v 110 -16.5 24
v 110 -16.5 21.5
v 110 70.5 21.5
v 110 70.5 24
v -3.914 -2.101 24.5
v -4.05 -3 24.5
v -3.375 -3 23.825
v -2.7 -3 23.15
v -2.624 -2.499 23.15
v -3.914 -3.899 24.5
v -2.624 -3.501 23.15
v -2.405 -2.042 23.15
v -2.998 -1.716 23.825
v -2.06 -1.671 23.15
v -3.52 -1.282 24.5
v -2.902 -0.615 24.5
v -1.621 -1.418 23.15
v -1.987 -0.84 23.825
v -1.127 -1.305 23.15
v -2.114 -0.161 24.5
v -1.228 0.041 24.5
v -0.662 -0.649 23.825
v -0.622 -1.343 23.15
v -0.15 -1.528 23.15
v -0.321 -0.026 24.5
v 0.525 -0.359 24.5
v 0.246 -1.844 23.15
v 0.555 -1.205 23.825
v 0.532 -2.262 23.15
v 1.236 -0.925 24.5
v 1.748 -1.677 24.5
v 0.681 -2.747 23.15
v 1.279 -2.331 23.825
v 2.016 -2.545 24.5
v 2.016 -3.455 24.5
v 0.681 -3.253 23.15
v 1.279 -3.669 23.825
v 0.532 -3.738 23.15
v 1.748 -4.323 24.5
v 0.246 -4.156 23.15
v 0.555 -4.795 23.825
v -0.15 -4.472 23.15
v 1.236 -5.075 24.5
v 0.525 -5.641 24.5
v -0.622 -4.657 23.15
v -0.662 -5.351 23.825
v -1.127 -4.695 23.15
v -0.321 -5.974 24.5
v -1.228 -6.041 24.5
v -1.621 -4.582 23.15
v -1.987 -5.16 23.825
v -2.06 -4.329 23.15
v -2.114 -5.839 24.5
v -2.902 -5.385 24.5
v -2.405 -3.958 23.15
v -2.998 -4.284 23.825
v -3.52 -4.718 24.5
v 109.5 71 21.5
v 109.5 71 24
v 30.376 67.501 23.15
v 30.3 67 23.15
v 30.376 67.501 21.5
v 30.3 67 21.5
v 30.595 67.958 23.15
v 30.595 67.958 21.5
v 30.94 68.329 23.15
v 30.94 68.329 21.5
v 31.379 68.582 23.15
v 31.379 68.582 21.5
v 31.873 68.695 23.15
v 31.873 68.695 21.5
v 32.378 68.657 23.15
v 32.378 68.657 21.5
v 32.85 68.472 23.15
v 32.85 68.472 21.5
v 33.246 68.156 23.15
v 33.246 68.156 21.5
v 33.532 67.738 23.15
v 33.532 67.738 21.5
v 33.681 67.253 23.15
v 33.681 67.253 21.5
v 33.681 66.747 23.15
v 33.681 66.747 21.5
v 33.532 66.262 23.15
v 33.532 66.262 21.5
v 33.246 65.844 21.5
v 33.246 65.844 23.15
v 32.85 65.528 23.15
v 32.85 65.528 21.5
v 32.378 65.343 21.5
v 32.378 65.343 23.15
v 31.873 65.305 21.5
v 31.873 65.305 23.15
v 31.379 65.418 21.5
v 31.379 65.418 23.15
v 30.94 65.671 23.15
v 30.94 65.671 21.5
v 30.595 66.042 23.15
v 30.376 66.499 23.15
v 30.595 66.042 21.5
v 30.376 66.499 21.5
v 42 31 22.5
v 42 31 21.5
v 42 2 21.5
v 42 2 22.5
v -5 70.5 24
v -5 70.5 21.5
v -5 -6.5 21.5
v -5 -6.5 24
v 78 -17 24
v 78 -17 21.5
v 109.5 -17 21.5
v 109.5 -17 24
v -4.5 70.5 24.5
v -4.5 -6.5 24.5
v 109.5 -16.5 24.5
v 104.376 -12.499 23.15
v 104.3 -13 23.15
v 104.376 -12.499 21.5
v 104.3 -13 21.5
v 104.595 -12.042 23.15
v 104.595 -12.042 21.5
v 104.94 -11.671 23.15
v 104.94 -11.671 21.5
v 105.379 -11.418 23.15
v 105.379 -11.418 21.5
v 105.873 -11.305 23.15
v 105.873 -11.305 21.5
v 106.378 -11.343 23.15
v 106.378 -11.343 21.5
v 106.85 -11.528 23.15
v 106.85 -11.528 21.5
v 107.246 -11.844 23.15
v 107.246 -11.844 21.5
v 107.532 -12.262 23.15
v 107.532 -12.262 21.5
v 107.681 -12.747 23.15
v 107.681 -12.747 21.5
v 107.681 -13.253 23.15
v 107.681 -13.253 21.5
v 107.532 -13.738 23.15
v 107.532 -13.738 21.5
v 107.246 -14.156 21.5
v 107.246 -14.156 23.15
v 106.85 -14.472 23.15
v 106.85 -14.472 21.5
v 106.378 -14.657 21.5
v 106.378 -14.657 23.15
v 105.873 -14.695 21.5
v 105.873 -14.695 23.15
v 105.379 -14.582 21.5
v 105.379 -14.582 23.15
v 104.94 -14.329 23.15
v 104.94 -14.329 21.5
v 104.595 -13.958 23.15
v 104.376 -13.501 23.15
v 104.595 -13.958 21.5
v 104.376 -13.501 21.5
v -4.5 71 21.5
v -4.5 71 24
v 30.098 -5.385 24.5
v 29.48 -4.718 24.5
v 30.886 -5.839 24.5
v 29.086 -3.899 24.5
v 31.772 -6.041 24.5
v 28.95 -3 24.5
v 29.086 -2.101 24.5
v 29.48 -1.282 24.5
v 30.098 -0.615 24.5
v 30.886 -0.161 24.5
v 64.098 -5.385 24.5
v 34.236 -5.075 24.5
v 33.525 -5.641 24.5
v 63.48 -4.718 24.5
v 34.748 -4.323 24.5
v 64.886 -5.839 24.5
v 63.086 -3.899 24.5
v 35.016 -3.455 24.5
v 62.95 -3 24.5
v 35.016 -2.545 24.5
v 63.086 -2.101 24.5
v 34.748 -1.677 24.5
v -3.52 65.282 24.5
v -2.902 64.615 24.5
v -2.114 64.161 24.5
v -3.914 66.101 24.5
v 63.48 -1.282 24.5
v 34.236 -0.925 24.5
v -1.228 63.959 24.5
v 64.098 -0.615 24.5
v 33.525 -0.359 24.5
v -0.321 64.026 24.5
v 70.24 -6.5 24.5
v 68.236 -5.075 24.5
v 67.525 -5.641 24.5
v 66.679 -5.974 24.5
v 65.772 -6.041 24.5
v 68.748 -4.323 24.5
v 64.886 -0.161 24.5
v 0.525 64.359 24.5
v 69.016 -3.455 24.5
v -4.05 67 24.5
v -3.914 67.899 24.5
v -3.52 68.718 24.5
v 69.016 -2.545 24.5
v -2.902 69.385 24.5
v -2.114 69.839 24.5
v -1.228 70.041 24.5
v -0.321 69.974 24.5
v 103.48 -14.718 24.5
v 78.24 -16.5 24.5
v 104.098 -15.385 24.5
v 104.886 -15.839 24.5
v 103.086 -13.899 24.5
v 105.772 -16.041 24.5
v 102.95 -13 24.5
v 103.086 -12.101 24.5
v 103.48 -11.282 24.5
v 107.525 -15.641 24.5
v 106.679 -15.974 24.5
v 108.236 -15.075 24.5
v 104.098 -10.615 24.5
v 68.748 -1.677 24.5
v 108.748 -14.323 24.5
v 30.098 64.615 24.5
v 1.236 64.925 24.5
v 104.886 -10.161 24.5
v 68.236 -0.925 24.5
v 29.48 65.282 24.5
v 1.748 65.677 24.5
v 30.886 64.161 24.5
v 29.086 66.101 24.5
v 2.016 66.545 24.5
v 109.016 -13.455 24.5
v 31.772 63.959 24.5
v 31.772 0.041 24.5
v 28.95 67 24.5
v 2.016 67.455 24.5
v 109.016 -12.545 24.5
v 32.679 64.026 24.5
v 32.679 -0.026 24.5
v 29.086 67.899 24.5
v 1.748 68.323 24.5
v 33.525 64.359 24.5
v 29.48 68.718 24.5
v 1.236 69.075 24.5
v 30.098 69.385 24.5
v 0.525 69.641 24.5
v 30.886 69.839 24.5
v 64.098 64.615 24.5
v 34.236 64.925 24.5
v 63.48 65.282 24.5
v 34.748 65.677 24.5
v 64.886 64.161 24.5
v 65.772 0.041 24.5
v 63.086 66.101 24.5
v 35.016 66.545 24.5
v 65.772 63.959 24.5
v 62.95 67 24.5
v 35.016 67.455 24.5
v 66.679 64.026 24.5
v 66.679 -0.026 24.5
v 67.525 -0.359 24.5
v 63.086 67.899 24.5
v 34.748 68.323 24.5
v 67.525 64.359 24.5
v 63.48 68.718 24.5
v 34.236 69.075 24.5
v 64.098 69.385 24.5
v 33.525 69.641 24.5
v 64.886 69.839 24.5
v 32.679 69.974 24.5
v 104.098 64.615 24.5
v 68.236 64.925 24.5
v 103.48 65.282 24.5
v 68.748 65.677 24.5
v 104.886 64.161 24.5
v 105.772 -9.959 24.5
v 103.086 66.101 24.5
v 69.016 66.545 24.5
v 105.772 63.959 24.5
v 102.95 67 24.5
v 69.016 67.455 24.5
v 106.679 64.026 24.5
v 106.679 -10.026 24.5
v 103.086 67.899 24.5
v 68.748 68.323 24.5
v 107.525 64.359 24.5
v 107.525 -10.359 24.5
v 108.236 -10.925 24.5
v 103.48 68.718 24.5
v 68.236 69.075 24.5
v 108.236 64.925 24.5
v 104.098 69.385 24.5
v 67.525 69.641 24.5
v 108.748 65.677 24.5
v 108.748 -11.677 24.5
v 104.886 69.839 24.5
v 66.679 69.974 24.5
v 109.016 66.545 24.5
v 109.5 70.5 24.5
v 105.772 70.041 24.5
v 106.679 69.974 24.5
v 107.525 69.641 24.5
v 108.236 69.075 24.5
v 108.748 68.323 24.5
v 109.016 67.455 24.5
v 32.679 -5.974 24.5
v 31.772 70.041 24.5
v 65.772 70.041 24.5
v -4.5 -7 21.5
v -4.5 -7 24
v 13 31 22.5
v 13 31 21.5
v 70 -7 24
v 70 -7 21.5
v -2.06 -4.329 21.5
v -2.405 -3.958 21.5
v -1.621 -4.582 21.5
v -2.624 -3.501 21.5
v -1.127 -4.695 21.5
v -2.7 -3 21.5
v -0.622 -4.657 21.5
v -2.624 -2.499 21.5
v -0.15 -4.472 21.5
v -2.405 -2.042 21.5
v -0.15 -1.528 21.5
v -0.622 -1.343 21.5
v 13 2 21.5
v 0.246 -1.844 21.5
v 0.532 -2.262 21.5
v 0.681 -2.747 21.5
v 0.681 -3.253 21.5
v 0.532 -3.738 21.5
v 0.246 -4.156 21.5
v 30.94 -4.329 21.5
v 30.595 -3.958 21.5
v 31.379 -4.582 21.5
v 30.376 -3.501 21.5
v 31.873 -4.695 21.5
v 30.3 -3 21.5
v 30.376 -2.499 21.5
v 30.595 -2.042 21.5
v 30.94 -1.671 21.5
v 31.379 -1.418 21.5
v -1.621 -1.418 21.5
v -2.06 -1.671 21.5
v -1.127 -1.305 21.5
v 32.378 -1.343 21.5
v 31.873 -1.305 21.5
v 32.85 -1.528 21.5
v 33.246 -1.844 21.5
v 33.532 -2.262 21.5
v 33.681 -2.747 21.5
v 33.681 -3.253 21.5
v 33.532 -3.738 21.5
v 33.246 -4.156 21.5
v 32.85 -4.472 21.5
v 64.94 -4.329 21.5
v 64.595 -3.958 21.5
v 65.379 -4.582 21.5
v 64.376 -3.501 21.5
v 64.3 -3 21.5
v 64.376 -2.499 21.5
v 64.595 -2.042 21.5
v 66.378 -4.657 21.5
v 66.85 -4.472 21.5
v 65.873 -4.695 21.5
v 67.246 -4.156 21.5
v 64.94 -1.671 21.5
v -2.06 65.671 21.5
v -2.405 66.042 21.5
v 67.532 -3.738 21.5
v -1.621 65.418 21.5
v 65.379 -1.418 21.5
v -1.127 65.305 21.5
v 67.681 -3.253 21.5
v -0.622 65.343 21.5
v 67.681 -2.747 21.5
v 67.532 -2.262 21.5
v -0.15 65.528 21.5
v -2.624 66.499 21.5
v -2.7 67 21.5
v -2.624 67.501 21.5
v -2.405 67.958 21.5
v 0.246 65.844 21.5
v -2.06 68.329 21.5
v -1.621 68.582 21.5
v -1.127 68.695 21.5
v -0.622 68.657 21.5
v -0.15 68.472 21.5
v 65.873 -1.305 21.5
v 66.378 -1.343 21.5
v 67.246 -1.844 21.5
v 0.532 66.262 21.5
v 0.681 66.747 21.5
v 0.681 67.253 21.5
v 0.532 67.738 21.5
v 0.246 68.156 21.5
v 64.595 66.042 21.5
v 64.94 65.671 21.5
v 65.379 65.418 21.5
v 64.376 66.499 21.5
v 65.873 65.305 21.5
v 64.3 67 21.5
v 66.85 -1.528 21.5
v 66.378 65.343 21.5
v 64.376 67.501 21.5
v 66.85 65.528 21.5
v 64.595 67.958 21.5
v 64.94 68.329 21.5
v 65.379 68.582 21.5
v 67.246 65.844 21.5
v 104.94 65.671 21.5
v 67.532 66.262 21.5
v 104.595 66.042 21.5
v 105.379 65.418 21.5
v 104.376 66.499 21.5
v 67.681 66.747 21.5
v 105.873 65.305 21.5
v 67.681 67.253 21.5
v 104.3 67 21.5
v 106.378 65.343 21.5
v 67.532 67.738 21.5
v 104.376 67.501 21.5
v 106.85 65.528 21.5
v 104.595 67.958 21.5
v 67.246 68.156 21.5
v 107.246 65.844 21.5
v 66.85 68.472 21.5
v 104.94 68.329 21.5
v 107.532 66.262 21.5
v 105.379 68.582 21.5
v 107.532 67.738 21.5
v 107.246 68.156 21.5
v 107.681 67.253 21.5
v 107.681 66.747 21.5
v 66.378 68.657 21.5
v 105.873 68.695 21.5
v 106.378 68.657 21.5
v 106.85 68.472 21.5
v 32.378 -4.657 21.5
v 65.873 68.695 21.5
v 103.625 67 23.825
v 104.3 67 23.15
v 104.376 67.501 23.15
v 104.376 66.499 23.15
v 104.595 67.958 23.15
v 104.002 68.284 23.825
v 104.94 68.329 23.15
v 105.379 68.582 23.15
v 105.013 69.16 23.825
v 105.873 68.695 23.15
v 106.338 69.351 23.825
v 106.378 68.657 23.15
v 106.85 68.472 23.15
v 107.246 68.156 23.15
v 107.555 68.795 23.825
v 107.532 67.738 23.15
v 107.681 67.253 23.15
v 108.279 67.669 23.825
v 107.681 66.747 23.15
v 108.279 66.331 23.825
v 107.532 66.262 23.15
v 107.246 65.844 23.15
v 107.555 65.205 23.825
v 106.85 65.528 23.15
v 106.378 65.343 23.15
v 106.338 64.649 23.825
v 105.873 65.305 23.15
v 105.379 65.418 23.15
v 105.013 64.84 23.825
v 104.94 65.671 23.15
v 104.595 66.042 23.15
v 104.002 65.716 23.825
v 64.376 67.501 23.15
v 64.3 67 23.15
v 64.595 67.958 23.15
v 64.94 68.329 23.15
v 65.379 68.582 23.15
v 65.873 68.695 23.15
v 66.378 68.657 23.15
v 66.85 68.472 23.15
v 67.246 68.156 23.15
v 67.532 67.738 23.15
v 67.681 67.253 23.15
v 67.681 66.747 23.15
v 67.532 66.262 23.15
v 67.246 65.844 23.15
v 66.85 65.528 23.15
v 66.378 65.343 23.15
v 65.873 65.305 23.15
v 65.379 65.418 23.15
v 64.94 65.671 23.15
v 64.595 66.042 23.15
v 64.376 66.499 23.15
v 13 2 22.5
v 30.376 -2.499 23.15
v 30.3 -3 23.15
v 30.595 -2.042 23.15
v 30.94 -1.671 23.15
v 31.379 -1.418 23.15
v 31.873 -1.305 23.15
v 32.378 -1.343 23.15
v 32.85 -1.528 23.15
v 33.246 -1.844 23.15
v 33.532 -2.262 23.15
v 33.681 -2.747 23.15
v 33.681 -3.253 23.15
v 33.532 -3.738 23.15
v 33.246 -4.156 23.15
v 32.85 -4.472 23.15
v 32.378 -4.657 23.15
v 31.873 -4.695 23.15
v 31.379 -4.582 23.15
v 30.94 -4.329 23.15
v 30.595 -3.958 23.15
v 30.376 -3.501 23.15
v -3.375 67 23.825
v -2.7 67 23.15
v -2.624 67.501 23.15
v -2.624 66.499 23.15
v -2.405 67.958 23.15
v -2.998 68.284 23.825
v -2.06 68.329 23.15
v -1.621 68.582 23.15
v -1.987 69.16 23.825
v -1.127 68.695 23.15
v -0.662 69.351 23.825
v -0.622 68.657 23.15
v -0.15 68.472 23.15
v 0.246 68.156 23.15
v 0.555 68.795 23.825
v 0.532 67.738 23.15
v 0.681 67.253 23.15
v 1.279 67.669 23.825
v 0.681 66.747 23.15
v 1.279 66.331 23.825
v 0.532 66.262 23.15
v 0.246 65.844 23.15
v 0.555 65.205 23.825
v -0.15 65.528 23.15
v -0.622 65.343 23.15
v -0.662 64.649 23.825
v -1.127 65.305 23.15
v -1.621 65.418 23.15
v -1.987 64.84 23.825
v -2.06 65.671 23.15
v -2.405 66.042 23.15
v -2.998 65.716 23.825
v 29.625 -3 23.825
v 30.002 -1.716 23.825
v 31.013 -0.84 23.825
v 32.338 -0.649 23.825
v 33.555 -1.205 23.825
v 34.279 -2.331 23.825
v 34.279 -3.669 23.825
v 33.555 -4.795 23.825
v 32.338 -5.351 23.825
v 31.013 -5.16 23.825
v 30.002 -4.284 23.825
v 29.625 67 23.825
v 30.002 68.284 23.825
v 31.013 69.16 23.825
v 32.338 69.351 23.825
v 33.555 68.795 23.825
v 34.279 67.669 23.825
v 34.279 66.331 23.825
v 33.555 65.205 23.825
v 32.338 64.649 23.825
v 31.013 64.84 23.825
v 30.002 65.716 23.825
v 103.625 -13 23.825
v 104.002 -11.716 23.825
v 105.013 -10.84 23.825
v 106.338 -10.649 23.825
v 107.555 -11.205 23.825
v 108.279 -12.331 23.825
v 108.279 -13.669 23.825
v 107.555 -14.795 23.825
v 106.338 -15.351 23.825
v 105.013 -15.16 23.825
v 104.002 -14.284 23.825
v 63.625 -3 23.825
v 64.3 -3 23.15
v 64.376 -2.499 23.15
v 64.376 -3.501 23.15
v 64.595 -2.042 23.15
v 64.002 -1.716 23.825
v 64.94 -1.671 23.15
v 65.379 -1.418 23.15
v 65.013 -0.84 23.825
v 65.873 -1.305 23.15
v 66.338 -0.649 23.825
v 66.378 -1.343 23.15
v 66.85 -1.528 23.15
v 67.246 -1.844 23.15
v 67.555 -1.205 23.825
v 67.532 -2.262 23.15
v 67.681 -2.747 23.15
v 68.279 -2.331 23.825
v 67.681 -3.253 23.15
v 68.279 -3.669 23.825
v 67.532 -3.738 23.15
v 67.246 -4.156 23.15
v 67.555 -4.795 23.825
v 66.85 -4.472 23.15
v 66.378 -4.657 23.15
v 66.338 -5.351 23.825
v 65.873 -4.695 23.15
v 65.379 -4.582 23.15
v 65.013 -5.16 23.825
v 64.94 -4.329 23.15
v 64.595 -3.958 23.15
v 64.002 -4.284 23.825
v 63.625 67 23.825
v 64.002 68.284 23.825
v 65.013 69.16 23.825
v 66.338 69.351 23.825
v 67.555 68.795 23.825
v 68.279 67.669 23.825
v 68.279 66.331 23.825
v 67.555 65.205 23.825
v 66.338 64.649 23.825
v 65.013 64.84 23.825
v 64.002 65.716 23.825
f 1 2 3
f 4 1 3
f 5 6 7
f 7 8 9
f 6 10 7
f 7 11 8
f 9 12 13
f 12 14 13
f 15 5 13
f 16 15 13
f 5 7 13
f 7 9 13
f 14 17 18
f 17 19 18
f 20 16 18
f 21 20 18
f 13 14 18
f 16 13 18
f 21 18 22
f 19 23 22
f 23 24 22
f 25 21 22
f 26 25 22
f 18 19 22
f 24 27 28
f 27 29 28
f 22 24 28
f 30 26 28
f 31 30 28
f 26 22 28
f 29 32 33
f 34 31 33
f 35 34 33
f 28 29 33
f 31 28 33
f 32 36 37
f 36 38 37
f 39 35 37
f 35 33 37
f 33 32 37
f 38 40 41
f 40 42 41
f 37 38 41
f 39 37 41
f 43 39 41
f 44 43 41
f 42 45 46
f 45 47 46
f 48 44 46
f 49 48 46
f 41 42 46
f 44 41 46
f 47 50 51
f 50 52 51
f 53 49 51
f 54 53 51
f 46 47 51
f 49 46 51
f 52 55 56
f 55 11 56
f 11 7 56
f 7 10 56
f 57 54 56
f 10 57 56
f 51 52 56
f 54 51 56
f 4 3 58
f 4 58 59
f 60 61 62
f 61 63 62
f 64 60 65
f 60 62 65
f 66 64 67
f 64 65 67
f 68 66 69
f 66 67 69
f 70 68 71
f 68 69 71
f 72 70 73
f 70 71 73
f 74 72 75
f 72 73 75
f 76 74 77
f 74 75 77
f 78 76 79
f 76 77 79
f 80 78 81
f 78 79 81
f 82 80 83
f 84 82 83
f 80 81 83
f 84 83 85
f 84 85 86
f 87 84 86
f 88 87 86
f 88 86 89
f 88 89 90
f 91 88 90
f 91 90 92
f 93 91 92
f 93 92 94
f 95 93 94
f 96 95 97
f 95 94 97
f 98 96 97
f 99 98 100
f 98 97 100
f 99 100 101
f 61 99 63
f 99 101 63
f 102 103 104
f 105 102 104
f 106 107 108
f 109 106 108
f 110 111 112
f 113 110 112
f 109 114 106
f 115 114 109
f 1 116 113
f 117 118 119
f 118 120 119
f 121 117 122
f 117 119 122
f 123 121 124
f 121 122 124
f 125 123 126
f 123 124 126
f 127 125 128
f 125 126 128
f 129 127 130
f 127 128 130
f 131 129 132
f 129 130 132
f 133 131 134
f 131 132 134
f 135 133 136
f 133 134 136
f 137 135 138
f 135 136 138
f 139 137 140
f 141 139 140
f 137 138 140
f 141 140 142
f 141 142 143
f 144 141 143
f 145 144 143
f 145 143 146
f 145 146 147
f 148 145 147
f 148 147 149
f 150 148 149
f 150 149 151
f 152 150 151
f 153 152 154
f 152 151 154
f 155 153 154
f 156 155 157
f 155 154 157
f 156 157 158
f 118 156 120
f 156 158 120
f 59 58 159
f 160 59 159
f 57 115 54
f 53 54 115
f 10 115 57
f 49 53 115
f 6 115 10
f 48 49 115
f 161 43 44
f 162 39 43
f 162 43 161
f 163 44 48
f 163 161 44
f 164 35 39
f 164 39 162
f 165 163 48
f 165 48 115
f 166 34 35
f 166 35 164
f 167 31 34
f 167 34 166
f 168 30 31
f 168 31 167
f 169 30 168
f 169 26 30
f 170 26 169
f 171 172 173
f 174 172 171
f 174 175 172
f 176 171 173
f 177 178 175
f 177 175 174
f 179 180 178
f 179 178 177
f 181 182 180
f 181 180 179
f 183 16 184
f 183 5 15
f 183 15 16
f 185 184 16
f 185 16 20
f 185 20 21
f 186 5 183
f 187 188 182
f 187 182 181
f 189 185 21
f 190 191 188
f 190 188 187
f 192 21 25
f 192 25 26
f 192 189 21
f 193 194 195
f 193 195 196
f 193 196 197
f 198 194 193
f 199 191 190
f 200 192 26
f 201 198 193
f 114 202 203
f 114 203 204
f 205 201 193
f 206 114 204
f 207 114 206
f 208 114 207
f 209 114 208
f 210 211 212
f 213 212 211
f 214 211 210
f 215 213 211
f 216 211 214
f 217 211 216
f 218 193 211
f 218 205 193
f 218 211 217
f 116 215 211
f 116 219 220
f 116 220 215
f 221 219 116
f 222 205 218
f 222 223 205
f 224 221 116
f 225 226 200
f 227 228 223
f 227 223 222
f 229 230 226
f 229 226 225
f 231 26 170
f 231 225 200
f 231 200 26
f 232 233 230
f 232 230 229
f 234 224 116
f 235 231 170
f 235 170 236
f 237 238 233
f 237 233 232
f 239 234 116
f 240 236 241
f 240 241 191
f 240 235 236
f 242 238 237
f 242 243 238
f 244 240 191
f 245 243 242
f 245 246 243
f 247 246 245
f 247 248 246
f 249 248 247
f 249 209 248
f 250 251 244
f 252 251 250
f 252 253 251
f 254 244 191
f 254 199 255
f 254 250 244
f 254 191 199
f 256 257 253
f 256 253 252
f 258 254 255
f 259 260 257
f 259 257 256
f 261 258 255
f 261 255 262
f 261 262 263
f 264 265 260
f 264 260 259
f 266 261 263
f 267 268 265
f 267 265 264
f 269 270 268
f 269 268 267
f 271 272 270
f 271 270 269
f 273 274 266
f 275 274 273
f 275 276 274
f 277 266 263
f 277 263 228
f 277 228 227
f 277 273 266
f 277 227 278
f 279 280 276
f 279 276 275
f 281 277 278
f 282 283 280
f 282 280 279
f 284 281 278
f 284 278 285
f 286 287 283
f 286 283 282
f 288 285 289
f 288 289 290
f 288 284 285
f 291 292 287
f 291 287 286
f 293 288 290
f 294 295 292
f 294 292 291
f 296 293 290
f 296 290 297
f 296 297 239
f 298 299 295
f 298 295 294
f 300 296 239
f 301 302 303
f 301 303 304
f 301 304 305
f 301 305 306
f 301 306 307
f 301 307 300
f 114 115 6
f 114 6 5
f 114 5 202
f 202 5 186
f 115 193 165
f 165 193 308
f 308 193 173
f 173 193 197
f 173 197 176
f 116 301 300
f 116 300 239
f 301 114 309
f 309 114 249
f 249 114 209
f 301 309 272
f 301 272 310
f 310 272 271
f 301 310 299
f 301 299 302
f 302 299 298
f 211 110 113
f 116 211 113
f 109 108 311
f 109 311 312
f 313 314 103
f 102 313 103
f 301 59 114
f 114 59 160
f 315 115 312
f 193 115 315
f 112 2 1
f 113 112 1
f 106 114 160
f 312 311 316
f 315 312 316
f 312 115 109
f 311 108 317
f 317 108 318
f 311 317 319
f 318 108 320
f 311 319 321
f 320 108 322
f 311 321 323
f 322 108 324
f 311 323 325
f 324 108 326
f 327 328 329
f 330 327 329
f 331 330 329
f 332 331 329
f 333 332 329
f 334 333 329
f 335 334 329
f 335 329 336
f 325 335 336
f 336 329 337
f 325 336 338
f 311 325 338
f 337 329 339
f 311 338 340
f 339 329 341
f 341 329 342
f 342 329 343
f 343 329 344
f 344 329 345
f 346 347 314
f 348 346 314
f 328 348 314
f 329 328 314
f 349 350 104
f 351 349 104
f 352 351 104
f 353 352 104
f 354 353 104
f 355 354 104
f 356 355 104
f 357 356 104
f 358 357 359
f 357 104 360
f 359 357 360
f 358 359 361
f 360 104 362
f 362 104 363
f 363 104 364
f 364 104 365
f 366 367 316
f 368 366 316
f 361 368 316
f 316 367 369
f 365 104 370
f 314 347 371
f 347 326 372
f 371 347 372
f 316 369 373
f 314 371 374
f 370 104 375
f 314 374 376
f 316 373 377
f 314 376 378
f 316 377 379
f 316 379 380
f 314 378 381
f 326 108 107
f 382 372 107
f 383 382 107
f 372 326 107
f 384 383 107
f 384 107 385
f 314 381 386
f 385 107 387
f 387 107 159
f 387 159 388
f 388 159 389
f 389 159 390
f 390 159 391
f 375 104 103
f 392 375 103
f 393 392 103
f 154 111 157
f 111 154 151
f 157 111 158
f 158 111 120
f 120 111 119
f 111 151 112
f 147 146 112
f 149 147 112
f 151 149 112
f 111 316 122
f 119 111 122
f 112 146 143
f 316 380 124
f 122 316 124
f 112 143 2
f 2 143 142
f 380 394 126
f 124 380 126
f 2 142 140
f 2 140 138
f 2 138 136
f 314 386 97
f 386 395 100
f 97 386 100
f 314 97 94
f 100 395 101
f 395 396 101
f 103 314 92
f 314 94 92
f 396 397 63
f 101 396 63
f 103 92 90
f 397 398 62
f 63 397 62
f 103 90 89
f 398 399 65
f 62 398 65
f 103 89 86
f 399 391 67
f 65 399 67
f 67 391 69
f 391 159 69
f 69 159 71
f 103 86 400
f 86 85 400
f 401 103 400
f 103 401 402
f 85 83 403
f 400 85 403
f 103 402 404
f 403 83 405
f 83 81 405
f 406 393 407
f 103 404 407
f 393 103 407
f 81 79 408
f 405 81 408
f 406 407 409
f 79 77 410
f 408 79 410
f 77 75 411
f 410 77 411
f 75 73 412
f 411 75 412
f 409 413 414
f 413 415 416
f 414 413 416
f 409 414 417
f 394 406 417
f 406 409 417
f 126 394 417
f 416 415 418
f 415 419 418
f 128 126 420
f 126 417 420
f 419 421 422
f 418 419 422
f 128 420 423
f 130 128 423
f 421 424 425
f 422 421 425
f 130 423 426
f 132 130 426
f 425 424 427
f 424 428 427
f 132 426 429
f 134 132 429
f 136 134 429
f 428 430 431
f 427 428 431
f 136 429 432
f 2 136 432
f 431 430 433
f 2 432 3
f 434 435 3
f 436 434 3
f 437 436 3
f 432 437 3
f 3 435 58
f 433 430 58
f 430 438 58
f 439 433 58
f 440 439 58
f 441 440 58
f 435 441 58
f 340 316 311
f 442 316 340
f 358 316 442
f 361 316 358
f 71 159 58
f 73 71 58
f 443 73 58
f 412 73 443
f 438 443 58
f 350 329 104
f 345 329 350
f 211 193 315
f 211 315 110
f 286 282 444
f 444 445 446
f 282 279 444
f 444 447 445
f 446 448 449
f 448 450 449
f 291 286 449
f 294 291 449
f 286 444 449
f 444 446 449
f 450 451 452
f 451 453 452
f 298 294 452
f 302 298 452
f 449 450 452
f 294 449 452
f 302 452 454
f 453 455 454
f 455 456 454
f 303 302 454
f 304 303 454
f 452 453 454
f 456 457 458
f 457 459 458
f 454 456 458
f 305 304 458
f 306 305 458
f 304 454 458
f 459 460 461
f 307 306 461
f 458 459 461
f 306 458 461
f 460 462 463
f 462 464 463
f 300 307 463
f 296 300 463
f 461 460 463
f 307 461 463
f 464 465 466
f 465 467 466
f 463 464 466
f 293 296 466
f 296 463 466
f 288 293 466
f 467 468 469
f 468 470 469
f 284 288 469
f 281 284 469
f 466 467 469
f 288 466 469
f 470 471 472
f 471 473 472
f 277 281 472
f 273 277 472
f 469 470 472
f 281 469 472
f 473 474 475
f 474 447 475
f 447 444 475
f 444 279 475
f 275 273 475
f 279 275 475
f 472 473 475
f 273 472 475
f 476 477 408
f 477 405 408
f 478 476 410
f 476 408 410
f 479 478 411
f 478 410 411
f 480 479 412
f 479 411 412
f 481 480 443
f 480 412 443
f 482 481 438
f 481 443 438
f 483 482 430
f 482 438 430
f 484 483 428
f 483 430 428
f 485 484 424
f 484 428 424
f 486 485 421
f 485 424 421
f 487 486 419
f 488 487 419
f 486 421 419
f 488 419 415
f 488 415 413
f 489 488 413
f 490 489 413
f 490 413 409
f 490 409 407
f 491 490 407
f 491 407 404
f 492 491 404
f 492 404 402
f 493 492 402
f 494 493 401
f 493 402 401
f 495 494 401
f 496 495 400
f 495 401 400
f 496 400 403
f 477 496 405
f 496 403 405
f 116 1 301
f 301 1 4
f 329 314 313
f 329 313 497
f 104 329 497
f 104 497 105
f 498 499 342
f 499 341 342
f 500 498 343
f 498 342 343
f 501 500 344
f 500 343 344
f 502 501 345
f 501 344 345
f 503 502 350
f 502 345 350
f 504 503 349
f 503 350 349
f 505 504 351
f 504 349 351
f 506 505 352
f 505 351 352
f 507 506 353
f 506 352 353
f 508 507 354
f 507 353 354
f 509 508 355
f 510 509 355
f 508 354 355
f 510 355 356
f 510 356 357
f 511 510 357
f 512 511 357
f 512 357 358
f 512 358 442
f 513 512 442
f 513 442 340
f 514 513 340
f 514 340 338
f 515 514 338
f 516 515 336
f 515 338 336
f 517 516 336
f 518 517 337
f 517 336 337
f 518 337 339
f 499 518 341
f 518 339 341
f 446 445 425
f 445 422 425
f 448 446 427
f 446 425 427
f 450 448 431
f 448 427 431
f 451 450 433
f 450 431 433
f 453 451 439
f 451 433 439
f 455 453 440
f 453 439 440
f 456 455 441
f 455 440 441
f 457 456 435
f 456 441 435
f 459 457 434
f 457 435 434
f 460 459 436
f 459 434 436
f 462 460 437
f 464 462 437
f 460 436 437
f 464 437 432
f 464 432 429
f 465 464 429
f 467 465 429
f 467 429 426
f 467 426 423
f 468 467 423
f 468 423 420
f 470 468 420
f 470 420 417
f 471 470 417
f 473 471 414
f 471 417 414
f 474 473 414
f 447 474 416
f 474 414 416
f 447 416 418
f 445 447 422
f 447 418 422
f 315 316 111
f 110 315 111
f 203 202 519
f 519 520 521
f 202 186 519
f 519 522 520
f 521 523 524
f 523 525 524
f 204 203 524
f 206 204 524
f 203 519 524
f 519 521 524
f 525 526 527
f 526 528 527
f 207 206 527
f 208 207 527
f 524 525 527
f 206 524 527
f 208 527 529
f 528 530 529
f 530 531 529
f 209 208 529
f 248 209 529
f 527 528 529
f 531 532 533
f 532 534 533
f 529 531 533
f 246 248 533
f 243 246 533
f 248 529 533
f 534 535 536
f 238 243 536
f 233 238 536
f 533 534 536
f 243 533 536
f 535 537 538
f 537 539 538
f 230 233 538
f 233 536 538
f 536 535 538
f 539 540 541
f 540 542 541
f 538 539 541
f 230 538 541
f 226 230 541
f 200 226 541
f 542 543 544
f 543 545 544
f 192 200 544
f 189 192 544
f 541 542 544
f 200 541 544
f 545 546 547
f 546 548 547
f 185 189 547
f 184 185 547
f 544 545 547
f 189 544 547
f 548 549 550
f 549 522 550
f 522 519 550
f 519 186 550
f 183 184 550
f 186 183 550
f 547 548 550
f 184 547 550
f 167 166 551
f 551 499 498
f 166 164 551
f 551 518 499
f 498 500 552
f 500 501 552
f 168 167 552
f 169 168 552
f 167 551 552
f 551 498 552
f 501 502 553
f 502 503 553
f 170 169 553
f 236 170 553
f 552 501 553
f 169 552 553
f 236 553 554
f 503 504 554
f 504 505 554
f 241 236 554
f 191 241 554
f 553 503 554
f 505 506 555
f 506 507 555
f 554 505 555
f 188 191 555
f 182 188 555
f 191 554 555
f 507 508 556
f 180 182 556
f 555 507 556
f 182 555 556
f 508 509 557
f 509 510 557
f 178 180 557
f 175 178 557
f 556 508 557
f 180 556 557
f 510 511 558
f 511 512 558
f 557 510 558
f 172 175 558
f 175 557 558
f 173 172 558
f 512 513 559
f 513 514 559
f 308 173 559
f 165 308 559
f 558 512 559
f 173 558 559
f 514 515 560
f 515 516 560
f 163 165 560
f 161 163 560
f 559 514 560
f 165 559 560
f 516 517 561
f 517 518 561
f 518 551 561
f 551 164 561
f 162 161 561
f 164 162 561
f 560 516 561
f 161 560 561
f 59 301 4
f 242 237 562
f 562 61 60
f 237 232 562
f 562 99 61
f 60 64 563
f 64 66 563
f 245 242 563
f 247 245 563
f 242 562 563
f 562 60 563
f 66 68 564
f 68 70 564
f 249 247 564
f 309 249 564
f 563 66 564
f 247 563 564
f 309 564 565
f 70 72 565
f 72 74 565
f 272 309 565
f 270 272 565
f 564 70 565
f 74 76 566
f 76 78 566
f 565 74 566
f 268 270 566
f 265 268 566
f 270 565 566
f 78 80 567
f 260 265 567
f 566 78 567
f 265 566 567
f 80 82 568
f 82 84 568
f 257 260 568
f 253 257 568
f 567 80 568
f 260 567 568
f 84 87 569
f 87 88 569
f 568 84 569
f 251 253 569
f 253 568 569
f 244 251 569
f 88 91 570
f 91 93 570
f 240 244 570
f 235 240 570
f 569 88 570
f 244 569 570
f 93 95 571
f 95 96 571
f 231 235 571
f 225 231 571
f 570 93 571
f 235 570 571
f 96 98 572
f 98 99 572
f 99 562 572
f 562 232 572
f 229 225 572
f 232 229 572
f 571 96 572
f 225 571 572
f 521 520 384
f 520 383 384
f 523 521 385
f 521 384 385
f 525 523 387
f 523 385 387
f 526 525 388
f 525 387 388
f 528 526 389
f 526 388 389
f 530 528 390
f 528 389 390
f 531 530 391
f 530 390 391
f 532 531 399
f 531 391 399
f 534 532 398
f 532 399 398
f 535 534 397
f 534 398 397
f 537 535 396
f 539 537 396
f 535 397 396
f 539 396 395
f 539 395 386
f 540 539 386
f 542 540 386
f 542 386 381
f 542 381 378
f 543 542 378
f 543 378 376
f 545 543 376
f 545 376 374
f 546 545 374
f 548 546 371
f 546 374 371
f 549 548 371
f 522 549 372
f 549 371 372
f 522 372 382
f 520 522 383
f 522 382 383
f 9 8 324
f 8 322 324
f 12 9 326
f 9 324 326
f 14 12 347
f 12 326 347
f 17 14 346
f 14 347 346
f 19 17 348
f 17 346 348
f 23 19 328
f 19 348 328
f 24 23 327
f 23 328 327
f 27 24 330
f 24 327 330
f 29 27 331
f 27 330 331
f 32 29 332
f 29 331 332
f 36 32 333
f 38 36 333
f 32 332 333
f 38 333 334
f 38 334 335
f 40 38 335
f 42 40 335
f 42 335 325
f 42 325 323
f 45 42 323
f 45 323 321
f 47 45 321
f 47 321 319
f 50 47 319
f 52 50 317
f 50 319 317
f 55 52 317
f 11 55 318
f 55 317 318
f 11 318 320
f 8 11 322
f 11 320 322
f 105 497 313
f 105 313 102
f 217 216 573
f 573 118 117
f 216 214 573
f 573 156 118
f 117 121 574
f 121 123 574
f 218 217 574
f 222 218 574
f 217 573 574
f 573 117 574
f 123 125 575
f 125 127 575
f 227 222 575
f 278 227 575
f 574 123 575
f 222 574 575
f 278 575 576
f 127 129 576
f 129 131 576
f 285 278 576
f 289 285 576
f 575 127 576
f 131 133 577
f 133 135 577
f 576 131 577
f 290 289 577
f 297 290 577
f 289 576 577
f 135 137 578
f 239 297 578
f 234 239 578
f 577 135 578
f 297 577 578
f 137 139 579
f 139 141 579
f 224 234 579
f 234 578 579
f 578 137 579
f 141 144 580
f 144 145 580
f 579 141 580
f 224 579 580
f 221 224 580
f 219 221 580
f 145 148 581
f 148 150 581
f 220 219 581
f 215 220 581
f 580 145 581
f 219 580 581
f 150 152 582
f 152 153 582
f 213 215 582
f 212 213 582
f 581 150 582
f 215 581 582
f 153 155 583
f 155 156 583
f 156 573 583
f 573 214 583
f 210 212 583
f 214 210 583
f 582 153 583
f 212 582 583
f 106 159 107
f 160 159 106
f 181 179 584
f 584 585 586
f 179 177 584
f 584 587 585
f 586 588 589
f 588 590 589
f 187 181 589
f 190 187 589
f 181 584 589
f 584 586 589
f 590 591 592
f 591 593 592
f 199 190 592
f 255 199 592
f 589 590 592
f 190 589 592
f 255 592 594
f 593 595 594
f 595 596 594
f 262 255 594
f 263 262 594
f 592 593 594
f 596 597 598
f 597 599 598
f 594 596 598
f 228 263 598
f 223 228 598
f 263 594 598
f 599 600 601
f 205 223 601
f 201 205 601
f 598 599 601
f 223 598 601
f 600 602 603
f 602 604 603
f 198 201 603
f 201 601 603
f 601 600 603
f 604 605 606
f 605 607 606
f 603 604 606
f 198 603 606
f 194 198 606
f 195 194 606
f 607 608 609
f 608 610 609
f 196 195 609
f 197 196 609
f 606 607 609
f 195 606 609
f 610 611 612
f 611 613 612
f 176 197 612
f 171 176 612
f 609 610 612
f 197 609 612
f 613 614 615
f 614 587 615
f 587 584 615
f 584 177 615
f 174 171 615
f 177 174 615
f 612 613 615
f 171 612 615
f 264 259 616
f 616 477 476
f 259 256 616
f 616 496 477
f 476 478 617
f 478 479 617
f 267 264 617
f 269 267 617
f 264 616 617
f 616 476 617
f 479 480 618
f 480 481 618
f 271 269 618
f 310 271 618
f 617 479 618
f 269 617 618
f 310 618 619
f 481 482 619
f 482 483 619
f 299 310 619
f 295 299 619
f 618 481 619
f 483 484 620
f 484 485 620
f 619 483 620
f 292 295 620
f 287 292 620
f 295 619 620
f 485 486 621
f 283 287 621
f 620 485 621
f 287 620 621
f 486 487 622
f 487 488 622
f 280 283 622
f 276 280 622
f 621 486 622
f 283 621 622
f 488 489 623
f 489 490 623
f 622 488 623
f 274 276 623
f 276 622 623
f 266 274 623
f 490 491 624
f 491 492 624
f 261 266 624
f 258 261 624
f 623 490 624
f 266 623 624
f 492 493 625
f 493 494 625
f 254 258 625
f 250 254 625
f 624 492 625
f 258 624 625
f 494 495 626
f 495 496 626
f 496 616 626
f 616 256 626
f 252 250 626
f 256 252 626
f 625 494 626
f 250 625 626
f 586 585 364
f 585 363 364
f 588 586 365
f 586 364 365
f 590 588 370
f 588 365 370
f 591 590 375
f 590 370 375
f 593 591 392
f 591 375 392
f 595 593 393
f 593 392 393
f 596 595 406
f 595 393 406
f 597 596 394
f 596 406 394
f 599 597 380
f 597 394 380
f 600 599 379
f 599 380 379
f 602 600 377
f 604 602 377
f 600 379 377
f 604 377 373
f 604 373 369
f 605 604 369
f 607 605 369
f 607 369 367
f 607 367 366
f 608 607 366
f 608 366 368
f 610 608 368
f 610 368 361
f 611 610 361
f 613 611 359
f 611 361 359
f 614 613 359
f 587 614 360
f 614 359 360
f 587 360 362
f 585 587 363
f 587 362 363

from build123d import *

# Parameters (mm, degrees)
PAD010_DEPTH        = 3
HOLE002_D           = 3.4
HOLE002_DEPTH       = 5
HOLE002_CSINK_D     = 6.1
HOLE002_CSINK_ANGLE = 90
SKETCH027_W         = 29
SKETCH027_H         = 29
POCKET009_DEPTH     = 1
CHAMFER001_SIZE     = 0.5


with BuildPart() as part:
    # Sketch022 (on Face1 of CopyPad011) → Pad010 (new body)
    with BuildSketch(Plane.XY.offset(24)):
        Polygon((-5, -7), (70, -7), (78, -17), (110, -17), (110, 71), (-5, 71), align=None)
    extrude(amount=PAD010_DEPTH)

    # Hole002
    with Locations(Plane.XY.offset(27)):
        with Locations((-1, 67), (106, 67), (106, -13), (-1, -3), (32, 67), (66, -3), (32, -3), (66, 67)):
            CounterSinkHole(HOLE002_D / 2, HOLE002_CSINK_D / 2, depth=HOLE002_DEPTH, counter_sink_angle=HOLE002_CSINK_ANGLE)

    # Sketch027 → Pocket009 (cut)
    with BuildSketch(Plane(origin=(0, 0, 24), x_dir=(1, 0, 0), z_dir=(0, 0, -1))):
        with Locations((27.5, -16.5)):
            Rectangle(SKETCH027_W, SKETCH027_H)
    extrude(amount=-POCKET009_DEPTH, mode=Mode.SUBTRACT)

    # Chamfer001
    chamfer001_edges = [part.edges().sort_by_distance(p)[0] for p in [
        (-5, 32, 27),
        (52.5, 71, 27),
        (110, 27, 27),
        (94, -17, 27),
        (74, -12, 27),
        (32.5, -7, 27),
        (110, 71, 25.5),
        (110, -17, 25.5),
        (-5, 71, 25.5),
        (-5, -7, 25.5),
    ]]
    chamfer(chamfer001_edges, length=CHAMFER001_SIZE)


with BuildPart() as part_1:
    # Body002 placement: moved
    add(part.part.moved(Location((0, 0, -2.5))))


solid = part_1.part
